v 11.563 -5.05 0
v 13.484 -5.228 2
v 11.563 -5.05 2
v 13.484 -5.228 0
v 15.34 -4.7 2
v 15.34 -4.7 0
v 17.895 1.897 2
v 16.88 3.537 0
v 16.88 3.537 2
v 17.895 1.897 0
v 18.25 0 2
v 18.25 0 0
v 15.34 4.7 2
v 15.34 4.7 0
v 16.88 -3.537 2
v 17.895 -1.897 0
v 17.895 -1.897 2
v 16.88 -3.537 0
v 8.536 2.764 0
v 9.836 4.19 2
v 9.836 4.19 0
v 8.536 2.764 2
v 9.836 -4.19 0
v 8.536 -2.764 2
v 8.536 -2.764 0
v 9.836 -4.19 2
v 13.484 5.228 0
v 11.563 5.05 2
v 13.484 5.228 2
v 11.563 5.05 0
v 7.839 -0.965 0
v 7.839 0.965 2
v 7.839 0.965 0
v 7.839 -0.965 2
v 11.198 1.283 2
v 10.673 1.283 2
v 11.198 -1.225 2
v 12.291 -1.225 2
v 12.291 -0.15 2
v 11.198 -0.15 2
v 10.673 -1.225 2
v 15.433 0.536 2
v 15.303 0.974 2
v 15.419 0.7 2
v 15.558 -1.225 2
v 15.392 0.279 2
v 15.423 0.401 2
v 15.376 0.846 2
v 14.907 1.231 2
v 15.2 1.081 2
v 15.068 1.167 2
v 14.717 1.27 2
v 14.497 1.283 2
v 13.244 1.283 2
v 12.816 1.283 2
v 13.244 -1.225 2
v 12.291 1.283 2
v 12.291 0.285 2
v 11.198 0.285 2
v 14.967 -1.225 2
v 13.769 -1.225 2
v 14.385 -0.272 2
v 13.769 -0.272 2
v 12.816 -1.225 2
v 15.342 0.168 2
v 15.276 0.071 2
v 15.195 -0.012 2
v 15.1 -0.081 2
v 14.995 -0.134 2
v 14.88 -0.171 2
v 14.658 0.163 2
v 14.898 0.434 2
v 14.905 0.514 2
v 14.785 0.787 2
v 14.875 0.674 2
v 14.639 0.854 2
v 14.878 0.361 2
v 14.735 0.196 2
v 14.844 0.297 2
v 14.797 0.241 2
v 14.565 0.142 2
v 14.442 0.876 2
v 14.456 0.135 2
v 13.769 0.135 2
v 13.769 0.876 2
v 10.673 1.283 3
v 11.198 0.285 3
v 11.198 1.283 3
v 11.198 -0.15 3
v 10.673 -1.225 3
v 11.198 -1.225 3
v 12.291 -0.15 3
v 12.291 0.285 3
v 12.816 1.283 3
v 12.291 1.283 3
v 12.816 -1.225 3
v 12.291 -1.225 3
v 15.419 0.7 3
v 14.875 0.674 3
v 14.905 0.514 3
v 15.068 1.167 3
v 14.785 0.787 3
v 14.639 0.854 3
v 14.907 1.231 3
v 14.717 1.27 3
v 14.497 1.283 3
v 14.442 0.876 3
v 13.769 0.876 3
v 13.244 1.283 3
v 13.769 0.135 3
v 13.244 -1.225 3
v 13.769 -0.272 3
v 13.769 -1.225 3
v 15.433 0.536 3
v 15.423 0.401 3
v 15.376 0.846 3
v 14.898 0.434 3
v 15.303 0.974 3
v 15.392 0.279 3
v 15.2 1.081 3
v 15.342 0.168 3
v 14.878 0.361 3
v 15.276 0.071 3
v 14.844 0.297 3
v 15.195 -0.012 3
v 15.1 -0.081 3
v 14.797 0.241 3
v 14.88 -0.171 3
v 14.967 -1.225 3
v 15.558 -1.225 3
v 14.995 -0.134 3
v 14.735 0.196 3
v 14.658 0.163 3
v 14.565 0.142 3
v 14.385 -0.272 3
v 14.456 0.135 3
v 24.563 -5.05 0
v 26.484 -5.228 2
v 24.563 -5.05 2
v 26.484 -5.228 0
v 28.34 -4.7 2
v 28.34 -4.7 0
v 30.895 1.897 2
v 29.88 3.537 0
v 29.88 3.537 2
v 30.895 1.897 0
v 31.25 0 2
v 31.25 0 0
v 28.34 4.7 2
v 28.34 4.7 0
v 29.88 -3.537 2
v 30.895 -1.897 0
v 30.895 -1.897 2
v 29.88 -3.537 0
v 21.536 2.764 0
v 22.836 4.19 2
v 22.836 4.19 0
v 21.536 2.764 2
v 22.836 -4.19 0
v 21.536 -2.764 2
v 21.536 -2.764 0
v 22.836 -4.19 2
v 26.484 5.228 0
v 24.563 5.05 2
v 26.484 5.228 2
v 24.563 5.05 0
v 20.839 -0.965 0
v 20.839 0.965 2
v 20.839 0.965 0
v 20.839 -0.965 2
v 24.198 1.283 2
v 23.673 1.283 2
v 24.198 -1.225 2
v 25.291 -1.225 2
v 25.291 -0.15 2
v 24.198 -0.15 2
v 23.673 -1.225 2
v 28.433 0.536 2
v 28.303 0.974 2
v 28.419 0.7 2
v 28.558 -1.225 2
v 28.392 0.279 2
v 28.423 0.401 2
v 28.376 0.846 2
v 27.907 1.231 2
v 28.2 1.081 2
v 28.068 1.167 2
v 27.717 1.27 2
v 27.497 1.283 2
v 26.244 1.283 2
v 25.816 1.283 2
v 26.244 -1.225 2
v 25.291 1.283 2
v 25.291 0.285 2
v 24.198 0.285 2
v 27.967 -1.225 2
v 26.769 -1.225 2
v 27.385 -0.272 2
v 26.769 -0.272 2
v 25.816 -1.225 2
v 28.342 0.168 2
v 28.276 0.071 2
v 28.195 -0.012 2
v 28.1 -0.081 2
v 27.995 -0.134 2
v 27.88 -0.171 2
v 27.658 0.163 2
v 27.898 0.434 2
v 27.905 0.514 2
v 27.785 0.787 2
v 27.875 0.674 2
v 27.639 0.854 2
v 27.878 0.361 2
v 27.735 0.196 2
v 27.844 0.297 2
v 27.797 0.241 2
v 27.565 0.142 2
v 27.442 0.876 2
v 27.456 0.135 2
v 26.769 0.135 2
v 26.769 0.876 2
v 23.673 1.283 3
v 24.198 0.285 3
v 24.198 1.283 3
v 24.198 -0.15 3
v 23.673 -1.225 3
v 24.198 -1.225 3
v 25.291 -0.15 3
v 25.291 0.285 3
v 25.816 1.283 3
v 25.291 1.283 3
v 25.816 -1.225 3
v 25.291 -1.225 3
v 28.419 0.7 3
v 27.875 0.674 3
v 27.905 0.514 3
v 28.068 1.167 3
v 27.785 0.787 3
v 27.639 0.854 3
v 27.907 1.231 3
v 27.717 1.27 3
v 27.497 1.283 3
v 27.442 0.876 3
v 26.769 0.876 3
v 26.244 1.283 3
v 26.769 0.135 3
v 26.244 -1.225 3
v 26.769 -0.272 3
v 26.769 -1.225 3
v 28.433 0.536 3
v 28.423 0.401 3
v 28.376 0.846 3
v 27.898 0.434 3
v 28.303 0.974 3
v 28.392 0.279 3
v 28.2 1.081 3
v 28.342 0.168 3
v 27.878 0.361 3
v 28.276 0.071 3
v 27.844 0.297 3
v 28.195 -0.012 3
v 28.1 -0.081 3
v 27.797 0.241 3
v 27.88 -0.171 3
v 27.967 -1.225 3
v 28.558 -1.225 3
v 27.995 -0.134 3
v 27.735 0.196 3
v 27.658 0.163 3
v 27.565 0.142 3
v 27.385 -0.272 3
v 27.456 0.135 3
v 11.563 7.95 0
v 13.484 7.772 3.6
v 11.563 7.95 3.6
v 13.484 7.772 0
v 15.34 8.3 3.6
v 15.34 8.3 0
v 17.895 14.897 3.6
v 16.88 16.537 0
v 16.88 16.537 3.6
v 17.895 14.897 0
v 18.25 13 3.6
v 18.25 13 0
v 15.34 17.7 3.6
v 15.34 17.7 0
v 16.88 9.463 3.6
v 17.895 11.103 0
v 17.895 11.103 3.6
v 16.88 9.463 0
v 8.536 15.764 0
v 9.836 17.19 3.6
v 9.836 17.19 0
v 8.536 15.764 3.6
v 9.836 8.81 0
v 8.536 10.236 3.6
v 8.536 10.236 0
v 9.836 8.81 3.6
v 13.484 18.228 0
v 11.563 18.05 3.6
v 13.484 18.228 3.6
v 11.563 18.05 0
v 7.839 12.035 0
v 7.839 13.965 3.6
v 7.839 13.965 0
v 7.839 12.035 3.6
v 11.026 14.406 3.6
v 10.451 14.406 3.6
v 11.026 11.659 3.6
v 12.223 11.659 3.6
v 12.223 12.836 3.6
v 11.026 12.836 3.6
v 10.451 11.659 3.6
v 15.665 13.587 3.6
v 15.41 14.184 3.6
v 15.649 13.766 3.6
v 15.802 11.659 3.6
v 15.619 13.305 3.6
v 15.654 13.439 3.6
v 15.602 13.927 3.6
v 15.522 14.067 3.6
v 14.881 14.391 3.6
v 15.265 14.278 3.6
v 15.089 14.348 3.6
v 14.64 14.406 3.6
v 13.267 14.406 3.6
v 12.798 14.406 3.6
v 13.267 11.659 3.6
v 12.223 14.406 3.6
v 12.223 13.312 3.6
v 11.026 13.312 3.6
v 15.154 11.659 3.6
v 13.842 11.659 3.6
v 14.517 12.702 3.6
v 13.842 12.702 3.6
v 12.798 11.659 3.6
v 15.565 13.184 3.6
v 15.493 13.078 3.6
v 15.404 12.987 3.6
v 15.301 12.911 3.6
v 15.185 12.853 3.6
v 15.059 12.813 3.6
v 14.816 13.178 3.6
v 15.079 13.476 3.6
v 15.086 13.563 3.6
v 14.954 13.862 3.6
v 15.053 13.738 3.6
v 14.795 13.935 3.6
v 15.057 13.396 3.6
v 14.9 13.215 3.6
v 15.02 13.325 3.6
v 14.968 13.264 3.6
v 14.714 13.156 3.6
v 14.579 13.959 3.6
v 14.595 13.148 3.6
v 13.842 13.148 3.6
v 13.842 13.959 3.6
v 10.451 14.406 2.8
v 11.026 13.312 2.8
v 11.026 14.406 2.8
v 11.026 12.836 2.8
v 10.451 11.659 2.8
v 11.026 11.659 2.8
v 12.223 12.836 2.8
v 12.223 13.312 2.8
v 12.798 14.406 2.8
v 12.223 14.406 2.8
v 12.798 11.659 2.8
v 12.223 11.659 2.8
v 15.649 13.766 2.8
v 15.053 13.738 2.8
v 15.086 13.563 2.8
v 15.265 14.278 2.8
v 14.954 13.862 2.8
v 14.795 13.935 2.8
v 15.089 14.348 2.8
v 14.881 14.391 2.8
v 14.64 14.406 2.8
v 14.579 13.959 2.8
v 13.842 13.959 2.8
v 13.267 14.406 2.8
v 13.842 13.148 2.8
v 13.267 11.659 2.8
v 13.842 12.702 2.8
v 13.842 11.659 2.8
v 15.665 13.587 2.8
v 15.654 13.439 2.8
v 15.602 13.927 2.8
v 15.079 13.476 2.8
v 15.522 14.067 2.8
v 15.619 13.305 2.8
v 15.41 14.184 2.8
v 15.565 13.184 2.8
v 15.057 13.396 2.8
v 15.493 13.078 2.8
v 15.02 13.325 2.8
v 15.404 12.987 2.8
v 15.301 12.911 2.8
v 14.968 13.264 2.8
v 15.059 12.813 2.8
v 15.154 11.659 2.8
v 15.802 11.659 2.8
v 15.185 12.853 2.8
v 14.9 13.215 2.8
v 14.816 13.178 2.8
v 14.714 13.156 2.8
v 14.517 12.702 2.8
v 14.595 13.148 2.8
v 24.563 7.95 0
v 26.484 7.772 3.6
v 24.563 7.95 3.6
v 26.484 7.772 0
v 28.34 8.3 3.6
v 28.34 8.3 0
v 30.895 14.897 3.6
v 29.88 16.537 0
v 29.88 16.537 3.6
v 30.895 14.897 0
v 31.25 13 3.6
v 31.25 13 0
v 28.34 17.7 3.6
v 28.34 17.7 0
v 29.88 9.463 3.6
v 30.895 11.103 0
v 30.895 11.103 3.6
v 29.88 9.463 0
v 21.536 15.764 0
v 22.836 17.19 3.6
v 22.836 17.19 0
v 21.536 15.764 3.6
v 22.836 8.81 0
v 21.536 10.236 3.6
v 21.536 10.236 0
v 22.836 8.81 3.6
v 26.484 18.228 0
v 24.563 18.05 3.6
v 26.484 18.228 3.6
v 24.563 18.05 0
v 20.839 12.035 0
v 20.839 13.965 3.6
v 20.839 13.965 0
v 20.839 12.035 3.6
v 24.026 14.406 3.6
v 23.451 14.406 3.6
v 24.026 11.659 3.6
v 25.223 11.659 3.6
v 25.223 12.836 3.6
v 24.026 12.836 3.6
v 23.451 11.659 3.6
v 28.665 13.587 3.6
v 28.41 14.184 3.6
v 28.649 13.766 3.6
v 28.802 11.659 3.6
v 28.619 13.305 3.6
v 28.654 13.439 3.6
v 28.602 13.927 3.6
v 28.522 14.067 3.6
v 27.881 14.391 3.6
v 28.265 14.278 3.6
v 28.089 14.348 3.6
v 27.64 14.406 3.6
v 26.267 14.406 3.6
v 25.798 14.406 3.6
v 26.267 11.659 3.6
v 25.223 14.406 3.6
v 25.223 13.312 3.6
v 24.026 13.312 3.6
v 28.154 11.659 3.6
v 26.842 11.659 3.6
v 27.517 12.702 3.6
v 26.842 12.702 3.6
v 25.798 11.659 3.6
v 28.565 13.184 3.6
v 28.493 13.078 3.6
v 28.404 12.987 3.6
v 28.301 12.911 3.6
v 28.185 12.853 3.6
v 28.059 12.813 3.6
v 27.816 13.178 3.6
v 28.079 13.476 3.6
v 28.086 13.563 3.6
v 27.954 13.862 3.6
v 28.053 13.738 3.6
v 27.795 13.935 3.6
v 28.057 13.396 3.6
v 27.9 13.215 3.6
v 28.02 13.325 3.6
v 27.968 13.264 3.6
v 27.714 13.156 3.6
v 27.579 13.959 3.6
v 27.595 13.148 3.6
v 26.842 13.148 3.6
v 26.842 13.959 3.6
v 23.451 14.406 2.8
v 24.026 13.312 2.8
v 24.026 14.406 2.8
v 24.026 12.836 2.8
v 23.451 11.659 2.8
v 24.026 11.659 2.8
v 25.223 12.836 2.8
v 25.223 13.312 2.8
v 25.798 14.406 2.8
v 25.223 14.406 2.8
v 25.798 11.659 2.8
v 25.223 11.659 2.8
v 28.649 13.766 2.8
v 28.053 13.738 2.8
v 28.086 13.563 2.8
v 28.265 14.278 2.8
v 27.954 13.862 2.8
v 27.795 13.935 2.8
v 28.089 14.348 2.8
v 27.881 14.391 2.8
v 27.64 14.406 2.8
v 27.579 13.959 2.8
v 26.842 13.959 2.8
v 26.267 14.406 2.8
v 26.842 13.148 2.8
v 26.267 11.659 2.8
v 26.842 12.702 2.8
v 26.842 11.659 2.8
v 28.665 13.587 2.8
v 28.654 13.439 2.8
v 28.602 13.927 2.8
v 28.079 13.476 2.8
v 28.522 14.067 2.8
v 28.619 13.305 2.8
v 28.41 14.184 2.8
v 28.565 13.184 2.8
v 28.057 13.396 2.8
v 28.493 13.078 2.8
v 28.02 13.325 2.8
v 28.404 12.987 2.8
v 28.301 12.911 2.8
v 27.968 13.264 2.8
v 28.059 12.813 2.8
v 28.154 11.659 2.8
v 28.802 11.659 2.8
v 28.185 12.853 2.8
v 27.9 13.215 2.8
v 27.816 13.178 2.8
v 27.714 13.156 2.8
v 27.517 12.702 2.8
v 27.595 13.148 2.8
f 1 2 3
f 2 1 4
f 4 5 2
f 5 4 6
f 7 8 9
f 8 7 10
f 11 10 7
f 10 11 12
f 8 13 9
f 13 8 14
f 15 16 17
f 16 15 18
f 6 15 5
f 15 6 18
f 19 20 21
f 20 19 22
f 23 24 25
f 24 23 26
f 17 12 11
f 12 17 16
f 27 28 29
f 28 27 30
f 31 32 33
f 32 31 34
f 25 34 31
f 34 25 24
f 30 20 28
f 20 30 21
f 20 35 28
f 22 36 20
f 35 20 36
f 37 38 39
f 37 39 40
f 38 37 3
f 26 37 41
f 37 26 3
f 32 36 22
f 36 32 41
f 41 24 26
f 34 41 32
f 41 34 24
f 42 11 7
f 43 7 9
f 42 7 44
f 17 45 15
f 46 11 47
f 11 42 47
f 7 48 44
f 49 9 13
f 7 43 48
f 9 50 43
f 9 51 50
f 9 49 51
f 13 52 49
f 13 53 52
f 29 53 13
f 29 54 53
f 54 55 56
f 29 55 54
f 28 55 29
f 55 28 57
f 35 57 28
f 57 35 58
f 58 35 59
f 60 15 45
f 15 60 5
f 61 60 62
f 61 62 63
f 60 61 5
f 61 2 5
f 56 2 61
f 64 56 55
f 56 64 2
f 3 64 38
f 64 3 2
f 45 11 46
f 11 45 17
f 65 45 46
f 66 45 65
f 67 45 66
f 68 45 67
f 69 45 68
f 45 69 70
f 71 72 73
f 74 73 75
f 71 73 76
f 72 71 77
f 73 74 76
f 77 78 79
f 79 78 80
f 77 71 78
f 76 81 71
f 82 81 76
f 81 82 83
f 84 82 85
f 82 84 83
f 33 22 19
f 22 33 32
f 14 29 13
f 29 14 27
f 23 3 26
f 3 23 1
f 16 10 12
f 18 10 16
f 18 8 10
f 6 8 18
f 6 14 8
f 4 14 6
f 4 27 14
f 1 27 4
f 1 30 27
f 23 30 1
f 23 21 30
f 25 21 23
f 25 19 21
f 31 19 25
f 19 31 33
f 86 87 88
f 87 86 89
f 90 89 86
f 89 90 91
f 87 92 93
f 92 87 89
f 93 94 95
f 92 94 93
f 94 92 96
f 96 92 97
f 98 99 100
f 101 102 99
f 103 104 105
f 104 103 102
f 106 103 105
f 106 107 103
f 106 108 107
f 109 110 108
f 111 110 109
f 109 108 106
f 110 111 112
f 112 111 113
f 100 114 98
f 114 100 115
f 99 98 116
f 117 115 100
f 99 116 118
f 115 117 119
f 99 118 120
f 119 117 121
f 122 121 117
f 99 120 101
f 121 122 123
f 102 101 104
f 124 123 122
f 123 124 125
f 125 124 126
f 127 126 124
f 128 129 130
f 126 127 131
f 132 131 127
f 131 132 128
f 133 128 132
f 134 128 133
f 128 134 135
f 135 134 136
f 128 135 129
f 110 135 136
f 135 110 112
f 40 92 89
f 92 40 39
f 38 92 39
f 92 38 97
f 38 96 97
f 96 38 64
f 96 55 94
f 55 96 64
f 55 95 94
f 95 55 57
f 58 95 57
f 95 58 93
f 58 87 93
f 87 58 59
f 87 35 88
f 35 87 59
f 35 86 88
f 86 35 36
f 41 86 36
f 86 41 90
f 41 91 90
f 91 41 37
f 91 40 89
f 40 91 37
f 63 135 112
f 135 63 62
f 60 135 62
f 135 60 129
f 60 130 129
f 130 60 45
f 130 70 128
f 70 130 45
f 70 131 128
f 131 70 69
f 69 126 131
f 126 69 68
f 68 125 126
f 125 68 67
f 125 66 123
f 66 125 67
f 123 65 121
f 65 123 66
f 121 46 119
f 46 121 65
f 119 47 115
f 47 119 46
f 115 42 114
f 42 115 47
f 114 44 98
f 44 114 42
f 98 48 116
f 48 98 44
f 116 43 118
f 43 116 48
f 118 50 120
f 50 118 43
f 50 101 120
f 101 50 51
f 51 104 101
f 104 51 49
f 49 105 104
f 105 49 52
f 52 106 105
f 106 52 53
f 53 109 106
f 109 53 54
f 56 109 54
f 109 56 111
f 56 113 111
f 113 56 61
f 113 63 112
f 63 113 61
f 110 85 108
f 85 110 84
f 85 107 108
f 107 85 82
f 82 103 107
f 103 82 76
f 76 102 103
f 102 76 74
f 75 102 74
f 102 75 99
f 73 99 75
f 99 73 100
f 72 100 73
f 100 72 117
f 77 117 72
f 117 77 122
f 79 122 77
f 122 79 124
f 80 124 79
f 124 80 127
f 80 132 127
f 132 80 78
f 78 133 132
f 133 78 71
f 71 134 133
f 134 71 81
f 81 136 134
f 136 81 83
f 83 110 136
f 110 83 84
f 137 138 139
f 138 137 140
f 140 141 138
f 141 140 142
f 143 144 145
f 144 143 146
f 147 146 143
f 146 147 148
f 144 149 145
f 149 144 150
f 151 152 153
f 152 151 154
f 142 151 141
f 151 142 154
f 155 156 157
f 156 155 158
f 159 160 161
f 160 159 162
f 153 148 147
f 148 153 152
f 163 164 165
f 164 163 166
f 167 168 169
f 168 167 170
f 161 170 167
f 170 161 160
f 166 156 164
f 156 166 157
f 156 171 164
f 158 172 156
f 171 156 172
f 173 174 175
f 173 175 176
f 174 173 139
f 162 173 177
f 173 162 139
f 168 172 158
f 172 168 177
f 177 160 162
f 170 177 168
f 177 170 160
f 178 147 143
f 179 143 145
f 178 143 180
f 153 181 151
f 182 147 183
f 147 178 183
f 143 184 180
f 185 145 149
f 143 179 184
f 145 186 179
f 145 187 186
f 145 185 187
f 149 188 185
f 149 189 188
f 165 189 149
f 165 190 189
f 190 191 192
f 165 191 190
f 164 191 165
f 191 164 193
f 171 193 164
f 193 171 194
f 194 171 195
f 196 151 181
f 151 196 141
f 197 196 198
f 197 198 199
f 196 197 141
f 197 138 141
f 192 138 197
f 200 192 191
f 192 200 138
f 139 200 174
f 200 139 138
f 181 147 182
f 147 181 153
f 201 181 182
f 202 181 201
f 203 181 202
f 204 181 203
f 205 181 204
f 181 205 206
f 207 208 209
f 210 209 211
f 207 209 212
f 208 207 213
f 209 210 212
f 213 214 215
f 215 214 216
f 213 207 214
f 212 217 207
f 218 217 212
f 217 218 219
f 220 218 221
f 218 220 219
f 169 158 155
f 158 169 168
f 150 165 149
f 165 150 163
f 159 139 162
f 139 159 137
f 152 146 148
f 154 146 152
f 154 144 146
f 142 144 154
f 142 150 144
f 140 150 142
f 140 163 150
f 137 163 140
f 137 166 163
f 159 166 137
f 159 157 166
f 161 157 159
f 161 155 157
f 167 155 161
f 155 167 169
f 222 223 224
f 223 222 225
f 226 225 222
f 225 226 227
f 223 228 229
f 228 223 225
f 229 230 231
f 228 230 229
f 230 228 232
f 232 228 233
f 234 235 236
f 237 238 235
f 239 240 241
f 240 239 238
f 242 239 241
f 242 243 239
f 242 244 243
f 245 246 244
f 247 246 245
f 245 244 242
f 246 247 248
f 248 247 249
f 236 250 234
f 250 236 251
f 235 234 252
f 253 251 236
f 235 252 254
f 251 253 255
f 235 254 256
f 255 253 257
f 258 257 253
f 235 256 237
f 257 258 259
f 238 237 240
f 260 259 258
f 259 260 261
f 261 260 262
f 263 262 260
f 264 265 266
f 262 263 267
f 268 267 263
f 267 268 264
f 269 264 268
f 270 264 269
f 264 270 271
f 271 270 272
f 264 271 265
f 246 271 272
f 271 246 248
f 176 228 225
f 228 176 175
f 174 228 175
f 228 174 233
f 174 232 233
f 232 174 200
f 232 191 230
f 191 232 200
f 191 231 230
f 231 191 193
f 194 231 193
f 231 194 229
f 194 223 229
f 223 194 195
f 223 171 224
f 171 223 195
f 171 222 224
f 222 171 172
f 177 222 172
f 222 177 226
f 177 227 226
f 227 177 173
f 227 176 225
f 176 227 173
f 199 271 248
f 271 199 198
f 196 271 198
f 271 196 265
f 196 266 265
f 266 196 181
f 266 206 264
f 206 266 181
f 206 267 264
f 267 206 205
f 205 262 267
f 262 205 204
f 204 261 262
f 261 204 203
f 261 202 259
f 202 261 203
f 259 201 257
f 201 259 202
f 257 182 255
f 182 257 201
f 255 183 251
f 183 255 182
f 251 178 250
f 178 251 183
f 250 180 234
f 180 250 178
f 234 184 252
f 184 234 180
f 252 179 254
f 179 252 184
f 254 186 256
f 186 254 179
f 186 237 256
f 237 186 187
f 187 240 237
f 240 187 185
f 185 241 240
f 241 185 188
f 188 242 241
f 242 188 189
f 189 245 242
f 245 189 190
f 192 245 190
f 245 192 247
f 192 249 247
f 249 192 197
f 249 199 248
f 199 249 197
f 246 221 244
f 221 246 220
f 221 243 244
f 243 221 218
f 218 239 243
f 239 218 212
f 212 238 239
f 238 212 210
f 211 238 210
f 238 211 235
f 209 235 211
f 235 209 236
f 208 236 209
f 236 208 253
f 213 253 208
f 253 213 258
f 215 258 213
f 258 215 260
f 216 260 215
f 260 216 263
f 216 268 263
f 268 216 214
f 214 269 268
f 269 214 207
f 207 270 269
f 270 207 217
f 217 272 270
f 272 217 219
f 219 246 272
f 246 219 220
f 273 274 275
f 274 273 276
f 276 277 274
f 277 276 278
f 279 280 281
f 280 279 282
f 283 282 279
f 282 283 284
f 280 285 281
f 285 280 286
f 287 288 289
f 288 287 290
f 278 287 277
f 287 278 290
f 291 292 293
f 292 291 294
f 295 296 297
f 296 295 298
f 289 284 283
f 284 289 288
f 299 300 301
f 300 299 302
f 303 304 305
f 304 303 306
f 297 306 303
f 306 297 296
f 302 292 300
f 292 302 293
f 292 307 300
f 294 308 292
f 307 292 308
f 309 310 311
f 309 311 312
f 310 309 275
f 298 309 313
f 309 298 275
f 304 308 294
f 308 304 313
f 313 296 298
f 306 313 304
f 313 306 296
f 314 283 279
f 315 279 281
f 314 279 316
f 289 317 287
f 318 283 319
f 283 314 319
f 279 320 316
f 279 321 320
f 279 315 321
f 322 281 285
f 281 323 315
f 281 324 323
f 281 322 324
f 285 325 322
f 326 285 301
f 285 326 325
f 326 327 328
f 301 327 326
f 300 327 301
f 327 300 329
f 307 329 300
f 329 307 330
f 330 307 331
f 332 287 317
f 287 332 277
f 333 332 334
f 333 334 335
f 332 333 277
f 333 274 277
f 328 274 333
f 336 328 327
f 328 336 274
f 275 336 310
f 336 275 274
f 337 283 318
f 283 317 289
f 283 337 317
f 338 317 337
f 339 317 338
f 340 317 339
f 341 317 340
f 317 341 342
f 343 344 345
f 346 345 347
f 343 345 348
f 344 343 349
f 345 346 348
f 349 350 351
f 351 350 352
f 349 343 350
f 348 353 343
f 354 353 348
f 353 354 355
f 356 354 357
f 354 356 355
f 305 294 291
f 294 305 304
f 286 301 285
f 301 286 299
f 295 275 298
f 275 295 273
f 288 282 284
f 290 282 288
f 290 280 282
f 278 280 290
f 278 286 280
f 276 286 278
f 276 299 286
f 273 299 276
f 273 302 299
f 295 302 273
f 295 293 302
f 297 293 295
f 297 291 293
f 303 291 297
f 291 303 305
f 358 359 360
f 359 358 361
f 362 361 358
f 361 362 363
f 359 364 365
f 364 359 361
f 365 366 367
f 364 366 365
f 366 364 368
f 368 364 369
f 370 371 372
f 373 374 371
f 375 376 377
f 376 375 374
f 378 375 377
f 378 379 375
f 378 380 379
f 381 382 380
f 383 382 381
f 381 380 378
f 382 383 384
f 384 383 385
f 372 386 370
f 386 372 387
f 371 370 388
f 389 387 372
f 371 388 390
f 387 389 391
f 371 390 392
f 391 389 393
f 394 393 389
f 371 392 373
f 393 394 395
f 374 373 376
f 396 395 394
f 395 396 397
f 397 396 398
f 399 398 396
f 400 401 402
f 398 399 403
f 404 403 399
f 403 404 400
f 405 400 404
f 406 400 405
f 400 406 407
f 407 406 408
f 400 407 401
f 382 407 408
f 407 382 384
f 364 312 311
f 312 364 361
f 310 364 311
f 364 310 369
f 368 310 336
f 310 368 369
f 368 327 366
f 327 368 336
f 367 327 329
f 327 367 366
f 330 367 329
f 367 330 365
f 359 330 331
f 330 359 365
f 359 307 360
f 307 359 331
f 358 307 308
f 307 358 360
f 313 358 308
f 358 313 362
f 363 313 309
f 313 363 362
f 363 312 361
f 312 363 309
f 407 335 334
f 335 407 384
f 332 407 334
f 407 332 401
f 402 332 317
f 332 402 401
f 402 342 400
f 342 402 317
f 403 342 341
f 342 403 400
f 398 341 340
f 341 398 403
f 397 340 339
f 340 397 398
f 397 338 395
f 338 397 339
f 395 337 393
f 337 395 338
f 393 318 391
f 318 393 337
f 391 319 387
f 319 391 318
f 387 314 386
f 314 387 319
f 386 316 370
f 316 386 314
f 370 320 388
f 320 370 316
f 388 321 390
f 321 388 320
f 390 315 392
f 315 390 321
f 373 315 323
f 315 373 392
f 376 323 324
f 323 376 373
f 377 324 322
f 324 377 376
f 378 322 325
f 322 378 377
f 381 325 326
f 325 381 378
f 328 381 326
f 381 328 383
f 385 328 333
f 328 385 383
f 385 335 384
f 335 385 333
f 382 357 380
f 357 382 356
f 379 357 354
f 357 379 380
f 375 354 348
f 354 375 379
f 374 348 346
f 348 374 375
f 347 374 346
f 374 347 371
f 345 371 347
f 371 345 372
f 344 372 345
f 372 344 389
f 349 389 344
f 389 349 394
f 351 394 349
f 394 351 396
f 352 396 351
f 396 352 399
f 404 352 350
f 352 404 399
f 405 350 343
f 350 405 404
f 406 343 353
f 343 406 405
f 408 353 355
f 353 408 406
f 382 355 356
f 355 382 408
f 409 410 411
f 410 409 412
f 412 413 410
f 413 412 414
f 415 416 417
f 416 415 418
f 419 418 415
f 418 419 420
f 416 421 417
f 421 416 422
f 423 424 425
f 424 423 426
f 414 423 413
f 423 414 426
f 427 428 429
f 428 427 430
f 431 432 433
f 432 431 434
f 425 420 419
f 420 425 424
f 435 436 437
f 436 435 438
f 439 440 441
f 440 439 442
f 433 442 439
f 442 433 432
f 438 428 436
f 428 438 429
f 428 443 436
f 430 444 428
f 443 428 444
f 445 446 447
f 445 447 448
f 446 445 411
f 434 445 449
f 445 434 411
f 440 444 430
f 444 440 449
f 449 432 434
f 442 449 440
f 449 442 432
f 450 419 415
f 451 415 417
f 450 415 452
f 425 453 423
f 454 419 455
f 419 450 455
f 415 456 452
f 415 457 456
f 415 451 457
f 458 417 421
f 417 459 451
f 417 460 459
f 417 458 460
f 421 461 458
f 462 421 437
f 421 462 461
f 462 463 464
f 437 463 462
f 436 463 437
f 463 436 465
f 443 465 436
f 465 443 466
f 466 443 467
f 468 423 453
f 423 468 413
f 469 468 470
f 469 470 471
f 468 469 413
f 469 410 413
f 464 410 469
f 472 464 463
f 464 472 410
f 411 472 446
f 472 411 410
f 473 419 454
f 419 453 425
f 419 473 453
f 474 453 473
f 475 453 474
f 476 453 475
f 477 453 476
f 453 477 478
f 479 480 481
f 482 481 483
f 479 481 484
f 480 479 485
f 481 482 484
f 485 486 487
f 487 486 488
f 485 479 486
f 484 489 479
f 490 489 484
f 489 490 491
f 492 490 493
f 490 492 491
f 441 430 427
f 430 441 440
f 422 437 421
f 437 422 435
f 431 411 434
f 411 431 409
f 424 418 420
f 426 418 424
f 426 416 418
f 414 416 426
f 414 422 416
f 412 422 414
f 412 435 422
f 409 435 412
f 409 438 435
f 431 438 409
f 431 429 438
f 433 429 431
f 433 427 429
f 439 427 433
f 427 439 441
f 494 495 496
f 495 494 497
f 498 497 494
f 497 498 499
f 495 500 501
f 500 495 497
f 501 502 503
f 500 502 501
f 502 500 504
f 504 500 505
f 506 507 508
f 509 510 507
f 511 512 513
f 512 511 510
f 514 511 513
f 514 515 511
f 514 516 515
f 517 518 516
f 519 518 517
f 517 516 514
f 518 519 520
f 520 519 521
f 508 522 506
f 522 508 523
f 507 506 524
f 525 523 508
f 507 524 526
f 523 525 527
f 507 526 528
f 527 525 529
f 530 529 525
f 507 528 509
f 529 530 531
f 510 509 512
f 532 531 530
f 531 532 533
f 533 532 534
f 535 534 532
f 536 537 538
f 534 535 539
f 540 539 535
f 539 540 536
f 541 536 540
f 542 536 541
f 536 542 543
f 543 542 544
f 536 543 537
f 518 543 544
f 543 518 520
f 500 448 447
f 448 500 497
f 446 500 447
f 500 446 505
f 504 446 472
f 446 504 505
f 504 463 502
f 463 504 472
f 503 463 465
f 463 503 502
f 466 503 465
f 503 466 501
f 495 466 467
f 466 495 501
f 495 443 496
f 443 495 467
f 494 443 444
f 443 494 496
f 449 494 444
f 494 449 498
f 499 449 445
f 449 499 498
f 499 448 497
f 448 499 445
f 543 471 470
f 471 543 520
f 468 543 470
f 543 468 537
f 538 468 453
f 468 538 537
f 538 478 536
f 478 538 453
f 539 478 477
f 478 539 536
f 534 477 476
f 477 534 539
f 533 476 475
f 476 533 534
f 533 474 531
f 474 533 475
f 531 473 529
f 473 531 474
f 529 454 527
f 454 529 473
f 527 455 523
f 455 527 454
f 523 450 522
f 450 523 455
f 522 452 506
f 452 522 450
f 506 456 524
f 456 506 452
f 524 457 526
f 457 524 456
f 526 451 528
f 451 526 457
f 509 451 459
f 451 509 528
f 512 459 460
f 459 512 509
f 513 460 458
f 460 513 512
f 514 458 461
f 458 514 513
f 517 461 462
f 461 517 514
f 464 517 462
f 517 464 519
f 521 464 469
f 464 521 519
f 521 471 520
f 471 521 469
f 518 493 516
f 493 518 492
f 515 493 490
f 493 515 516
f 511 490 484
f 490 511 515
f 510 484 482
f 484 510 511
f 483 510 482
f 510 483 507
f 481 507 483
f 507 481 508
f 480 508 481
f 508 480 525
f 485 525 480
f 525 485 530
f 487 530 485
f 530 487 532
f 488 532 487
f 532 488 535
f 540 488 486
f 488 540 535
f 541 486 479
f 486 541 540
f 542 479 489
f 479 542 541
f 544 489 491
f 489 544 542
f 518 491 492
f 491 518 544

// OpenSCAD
include <../../Scripts/18xx tiles basic functions.scad>
make_token_array("HR",2,2,0,"th");
